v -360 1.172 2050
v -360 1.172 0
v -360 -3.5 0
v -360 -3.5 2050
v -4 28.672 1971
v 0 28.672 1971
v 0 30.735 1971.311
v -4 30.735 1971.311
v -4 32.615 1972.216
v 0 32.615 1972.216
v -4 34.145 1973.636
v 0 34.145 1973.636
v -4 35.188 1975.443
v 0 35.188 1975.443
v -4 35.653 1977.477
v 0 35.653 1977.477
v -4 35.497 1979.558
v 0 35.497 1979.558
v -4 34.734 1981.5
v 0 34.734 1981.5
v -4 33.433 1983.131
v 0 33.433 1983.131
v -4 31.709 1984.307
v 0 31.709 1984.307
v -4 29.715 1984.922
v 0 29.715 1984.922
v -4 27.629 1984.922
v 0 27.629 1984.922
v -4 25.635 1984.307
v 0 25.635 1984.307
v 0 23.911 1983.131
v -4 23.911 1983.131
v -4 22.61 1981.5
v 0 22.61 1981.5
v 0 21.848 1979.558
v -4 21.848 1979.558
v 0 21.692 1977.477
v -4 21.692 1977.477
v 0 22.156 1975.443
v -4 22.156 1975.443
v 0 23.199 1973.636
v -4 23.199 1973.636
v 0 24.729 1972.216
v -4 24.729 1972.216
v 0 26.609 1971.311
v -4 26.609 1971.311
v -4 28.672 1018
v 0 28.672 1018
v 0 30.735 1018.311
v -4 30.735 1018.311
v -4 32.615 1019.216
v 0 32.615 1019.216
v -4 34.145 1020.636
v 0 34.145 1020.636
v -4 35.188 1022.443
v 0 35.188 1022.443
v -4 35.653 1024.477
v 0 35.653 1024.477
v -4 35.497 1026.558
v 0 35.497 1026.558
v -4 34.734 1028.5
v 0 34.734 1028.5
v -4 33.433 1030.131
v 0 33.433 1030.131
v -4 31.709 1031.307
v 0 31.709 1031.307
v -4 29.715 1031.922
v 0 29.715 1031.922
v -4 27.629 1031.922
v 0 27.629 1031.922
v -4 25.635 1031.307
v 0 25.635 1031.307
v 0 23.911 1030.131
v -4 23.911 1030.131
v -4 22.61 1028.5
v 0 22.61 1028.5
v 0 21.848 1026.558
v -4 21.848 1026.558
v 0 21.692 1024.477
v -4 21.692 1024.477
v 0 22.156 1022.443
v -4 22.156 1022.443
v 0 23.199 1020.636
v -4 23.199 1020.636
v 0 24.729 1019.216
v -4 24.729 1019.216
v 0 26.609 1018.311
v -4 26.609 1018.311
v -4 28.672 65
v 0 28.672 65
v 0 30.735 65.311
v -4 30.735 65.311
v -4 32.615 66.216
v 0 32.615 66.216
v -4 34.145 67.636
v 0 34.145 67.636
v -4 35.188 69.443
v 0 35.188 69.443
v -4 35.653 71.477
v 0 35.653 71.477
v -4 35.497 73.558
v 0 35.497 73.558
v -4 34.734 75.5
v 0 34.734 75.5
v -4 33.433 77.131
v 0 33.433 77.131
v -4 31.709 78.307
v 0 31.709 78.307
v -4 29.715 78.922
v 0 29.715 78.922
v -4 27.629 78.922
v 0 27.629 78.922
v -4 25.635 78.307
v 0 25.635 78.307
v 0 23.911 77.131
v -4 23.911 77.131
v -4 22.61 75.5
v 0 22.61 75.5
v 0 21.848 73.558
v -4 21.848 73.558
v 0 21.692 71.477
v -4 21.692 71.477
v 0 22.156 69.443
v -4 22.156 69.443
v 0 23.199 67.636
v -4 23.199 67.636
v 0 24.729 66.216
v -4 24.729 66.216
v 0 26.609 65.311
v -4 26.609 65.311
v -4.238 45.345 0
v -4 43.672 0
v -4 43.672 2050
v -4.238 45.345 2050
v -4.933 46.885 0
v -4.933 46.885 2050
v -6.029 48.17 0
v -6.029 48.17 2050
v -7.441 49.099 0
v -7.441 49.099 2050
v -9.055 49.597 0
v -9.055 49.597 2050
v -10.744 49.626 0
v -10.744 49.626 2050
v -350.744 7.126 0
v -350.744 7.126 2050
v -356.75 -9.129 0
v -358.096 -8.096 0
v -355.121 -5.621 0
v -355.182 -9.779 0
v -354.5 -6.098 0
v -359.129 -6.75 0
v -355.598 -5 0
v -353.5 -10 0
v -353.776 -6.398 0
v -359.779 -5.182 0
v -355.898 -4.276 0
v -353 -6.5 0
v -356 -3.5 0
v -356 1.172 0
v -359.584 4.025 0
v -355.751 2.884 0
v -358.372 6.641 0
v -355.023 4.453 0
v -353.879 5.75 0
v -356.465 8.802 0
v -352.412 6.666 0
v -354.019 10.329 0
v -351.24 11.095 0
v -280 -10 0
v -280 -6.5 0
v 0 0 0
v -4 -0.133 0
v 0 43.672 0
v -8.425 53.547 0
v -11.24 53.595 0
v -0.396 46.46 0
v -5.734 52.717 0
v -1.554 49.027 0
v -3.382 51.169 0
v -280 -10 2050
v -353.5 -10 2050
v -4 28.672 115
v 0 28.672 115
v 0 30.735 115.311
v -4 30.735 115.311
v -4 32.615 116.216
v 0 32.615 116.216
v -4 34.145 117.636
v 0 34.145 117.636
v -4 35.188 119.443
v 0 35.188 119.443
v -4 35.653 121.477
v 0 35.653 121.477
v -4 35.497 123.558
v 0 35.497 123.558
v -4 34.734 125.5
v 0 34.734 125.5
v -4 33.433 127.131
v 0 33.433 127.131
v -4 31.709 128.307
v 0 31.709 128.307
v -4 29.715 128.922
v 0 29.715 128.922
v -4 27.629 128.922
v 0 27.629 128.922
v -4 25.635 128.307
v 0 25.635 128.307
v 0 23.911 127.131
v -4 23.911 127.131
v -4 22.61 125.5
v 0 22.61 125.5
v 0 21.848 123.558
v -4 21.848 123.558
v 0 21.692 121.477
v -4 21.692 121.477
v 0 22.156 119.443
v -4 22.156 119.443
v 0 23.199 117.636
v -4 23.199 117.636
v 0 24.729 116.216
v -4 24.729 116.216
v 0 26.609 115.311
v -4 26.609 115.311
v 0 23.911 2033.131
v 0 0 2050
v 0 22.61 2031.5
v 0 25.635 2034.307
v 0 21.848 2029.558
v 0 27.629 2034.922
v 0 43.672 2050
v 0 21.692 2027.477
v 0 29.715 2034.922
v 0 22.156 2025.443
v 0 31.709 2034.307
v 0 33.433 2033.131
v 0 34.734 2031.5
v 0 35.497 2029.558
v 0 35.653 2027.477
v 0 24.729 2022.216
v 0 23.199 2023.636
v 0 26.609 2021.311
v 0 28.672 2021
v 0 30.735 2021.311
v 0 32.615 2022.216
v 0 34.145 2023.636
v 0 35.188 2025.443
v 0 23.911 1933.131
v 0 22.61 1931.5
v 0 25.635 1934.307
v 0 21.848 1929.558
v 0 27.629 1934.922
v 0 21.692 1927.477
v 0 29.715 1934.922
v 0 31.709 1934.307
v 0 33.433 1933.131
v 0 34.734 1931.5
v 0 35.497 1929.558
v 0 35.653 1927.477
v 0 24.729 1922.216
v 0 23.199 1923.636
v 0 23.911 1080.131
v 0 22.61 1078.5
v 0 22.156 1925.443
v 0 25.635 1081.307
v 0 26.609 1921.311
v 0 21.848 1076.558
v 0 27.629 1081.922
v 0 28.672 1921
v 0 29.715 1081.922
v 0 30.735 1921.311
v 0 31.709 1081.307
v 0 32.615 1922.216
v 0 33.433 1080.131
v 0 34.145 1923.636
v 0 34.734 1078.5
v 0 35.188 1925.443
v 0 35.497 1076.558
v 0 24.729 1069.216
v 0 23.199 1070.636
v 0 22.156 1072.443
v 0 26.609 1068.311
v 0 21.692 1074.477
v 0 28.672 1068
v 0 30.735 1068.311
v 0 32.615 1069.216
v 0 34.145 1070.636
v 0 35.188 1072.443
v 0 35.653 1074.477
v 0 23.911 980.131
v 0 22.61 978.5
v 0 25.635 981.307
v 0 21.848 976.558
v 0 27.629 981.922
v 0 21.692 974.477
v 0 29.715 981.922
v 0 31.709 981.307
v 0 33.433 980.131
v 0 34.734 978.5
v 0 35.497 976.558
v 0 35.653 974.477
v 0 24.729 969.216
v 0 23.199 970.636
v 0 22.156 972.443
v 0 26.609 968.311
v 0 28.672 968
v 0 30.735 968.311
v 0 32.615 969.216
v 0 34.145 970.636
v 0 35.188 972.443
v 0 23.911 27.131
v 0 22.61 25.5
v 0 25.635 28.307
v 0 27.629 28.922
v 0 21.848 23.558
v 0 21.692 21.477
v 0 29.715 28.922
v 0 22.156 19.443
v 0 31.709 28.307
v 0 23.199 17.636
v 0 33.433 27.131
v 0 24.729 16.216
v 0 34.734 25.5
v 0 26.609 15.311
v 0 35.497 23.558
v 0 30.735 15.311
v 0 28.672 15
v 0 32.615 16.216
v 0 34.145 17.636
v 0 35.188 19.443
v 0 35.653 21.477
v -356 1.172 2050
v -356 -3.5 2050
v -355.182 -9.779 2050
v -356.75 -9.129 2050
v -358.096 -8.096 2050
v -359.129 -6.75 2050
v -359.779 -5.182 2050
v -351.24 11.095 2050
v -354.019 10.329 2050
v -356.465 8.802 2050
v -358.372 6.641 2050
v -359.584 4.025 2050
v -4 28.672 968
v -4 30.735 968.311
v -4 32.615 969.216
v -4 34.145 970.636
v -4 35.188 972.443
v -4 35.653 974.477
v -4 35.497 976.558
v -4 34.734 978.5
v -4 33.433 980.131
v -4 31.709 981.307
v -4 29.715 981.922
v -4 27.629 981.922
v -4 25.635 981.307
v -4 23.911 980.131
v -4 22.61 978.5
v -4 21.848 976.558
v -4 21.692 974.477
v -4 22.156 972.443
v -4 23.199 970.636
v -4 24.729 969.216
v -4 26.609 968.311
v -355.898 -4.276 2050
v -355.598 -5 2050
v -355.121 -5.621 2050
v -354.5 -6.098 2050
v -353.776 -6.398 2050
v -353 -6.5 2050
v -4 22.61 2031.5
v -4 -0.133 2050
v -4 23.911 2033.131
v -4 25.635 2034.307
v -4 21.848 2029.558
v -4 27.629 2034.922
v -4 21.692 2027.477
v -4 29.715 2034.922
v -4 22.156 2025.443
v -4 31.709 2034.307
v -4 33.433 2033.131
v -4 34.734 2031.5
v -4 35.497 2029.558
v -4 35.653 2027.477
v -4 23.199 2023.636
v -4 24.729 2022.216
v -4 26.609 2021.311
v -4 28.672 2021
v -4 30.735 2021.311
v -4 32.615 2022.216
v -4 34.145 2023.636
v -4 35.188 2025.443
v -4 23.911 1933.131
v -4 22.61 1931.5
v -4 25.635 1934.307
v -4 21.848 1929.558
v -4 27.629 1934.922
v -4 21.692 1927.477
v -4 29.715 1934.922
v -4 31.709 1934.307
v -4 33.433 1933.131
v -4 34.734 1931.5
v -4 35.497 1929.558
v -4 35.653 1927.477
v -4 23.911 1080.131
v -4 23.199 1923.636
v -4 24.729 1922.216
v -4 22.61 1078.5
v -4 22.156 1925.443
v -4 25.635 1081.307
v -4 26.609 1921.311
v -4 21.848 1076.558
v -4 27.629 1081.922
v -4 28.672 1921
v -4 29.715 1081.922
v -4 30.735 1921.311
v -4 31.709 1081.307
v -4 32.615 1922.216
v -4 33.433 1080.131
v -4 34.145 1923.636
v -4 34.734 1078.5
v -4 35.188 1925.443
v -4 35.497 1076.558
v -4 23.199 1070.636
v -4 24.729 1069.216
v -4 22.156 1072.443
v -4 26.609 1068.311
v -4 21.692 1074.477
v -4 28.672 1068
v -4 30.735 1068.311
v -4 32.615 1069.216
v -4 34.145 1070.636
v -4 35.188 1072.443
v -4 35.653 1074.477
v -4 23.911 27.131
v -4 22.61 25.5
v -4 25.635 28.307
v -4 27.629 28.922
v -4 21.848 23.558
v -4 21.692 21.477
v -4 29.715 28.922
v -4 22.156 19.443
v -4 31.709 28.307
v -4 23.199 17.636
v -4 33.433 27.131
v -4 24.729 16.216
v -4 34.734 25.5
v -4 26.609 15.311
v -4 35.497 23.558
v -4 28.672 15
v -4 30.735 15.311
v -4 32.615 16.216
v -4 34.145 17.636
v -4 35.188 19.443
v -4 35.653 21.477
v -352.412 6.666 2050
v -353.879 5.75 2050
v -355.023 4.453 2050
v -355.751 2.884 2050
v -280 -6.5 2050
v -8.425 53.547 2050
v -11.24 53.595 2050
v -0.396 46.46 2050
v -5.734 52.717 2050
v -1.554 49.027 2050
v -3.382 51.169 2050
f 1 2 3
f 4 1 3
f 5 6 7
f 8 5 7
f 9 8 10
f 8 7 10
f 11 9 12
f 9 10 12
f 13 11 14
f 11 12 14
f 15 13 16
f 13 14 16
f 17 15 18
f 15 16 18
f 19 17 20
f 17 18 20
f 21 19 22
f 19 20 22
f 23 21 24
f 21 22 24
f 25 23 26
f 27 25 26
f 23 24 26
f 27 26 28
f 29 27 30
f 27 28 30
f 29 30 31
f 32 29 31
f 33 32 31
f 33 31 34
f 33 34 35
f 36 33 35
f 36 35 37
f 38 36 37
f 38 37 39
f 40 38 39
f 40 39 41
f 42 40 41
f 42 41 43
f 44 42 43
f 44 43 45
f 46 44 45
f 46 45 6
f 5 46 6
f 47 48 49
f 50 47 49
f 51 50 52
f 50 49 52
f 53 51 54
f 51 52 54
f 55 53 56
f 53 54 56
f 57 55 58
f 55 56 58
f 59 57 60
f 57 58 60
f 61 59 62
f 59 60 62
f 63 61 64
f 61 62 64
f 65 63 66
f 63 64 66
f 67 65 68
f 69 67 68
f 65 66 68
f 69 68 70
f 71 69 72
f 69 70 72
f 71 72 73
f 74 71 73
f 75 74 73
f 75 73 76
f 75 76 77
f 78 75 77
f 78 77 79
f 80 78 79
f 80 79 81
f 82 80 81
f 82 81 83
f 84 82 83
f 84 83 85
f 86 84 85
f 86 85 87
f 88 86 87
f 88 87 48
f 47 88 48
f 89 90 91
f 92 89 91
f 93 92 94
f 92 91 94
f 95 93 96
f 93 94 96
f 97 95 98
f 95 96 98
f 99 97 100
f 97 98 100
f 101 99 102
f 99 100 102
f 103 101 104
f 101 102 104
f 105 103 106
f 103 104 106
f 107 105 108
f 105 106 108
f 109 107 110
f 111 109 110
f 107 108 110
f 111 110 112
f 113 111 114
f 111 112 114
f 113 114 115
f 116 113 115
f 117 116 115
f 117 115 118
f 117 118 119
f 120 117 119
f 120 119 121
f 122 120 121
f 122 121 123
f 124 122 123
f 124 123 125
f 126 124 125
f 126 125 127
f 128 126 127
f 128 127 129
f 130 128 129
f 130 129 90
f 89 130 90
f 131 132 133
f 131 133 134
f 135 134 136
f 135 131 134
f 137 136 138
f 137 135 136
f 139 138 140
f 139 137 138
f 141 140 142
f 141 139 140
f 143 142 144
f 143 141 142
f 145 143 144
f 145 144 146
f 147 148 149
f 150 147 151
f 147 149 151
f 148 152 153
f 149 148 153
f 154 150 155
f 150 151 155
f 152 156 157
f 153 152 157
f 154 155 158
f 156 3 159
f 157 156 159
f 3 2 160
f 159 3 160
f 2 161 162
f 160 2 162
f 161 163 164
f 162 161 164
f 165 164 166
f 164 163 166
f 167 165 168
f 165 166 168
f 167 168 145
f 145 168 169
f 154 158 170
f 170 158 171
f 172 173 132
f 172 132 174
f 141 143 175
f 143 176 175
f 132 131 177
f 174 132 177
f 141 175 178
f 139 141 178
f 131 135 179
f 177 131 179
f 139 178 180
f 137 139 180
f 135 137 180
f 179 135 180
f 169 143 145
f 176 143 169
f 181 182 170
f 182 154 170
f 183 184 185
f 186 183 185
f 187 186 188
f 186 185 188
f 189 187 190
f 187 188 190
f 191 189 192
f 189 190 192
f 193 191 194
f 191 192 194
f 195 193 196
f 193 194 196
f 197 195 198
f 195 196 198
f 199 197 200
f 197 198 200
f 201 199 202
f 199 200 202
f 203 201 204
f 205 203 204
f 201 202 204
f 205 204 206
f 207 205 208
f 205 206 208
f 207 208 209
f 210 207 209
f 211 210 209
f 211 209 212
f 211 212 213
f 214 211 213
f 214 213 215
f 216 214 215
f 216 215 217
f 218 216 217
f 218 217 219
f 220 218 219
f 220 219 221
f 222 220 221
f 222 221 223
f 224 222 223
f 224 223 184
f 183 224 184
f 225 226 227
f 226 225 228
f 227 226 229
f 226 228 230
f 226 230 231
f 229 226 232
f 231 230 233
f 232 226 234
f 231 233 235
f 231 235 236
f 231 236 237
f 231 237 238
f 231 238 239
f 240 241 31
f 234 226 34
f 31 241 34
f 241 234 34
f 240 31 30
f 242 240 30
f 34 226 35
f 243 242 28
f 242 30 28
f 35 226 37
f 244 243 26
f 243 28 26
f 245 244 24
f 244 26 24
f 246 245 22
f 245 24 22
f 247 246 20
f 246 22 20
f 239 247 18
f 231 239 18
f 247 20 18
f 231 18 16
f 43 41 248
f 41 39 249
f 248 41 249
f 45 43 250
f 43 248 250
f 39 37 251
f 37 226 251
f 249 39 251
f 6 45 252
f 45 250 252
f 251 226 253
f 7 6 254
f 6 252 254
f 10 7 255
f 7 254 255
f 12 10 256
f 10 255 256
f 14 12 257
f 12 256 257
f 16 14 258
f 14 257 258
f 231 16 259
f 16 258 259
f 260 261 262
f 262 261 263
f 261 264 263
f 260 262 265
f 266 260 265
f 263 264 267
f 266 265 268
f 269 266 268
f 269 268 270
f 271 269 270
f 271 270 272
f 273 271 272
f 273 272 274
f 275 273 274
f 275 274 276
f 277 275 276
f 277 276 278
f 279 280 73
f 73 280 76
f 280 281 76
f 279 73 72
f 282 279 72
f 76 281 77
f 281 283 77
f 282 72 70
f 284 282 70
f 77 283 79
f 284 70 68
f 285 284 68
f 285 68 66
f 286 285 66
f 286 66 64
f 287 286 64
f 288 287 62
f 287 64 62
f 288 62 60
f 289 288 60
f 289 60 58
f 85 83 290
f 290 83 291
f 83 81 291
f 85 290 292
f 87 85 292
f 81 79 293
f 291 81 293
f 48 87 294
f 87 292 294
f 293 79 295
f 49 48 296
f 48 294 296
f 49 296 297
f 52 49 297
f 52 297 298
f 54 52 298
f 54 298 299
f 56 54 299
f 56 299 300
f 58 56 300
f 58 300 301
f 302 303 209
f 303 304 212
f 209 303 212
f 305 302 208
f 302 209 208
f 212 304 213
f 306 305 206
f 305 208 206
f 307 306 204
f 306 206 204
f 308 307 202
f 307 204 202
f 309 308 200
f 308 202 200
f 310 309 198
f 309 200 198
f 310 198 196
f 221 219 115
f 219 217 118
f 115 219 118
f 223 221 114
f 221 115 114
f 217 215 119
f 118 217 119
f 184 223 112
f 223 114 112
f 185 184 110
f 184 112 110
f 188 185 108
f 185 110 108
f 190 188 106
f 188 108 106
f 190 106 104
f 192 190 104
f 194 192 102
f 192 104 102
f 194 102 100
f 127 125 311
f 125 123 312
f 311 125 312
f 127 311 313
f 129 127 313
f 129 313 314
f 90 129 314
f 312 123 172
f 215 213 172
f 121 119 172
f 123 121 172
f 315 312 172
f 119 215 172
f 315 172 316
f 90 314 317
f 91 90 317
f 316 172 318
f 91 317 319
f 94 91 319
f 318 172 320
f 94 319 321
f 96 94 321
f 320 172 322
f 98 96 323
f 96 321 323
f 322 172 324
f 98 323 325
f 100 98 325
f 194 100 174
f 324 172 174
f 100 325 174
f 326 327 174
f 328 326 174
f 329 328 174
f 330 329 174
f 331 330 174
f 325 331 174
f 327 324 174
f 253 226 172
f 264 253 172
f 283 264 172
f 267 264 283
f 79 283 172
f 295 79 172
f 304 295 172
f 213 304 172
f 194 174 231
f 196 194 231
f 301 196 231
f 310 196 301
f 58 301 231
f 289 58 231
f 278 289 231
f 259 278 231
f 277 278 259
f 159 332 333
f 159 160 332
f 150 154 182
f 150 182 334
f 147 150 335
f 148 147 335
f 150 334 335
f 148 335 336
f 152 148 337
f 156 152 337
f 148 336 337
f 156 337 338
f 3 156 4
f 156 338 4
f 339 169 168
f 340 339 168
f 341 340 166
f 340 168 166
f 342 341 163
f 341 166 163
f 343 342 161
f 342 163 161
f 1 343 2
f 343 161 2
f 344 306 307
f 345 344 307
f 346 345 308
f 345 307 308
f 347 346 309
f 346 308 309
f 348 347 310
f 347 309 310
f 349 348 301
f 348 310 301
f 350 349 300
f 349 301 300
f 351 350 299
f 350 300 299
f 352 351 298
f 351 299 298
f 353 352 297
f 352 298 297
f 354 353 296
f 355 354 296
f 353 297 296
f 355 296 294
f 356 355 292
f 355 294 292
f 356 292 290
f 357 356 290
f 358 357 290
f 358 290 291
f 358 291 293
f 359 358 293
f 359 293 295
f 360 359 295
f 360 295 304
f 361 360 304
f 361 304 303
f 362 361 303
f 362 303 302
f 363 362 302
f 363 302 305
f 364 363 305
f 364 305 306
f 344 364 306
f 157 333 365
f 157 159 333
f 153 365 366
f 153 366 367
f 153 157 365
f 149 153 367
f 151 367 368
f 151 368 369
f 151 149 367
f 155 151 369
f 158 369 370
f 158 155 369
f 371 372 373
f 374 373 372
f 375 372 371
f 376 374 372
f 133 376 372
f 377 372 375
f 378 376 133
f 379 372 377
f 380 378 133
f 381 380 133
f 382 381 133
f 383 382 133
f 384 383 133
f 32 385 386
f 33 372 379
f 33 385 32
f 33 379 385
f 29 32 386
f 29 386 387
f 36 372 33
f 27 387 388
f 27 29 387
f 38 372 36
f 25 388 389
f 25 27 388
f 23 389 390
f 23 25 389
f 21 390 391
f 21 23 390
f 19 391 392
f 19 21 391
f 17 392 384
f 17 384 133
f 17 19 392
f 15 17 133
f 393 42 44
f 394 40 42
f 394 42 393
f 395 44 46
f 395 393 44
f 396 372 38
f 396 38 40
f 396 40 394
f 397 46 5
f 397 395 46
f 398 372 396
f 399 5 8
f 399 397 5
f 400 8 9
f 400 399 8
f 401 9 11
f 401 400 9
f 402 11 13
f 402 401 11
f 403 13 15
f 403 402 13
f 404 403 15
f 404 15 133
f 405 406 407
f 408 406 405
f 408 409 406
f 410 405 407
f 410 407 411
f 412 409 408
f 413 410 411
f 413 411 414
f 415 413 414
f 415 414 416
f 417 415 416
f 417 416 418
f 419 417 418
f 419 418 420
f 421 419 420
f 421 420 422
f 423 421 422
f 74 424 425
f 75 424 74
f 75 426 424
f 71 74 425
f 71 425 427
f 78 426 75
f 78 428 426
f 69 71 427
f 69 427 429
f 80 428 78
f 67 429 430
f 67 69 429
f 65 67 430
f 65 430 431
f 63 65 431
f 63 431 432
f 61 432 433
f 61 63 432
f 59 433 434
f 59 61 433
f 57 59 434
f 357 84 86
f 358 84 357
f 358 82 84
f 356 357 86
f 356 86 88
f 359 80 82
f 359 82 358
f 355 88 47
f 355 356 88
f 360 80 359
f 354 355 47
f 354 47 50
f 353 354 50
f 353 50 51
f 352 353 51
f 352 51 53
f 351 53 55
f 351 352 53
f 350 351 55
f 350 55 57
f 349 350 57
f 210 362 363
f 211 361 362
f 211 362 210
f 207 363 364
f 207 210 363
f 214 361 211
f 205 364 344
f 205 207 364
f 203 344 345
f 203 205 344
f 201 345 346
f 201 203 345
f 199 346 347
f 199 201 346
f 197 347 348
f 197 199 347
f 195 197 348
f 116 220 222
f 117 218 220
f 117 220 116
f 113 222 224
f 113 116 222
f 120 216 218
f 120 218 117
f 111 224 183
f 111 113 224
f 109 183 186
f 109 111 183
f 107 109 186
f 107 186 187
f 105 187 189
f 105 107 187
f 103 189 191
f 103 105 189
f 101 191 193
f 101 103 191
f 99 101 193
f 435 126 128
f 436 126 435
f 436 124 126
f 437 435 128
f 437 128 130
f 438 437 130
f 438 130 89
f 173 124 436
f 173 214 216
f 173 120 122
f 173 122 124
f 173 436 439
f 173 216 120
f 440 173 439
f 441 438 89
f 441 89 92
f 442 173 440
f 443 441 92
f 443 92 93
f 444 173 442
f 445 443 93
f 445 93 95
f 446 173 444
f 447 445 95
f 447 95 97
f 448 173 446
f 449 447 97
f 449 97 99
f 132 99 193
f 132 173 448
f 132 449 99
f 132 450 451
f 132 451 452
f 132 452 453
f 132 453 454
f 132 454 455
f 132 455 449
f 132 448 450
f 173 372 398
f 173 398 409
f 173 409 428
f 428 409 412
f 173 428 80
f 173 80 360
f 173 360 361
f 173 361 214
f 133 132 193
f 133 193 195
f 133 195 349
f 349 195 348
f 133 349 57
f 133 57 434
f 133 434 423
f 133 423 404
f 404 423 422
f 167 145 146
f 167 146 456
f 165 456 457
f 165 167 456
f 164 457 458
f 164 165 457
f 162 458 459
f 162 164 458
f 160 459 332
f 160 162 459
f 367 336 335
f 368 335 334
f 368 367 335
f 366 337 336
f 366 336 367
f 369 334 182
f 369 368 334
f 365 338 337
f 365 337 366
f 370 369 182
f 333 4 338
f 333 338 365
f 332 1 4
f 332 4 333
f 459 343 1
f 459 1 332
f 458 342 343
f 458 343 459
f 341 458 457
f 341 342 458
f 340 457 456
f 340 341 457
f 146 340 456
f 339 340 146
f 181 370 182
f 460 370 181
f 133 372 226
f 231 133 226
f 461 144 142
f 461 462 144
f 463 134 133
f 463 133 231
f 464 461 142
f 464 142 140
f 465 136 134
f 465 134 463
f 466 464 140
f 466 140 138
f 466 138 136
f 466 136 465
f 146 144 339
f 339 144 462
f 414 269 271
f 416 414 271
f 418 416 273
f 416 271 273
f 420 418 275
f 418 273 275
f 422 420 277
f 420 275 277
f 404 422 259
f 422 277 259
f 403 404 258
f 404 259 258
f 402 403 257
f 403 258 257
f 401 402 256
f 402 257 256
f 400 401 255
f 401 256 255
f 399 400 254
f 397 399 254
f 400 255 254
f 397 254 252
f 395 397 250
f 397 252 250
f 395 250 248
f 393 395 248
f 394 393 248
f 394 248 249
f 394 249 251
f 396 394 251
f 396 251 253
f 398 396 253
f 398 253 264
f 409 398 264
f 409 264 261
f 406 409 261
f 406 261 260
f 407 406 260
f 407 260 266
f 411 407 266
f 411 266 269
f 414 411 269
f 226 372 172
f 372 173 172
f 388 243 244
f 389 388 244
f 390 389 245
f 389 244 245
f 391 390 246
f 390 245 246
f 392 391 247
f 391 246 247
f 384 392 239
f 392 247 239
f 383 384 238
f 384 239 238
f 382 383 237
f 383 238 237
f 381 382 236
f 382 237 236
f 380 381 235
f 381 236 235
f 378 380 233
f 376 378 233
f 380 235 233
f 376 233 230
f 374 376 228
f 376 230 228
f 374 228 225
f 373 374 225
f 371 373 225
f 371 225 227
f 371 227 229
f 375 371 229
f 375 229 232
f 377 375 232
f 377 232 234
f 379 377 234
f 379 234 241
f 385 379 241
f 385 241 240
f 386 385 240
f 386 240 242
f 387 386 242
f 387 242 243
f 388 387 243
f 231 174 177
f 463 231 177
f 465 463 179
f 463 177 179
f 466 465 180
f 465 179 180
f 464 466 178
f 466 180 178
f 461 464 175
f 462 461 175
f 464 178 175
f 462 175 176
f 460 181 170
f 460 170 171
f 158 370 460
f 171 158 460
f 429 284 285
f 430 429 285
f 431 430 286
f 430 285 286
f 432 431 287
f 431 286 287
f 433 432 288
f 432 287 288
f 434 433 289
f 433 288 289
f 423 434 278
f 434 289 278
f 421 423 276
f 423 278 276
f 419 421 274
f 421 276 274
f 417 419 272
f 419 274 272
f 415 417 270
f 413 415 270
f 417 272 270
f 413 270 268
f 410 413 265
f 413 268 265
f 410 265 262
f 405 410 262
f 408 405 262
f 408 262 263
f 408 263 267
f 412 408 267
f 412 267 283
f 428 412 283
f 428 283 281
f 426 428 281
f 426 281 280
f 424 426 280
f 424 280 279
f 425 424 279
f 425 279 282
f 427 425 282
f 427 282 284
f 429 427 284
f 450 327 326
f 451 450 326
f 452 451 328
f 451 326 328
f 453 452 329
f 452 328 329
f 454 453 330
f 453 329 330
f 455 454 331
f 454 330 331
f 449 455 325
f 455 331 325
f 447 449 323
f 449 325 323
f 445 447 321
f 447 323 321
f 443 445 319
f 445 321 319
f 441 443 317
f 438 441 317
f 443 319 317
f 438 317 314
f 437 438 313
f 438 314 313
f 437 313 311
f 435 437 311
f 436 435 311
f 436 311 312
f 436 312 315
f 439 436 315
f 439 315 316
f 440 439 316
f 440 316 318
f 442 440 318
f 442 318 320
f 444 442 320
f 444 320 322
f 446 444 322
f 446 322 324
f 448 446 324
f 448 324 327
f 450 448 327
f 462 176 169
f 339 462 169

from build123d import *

# Parameters (mm, degrees)
EXTRUDE_1_DEPTH     = 2050
SHELL_1_T           = -4
CUT_EXTRUDE_1_REACH = 362
SKETCH_2_R          = 7
SKETCH_3_W          = 80
SKETCH_3_H          = 3.5
EXTRUDE_2_DEPTH     = 2050
FILLET_1_R          = 3
FILLET_2_R          = 6.5


with BuildPart() as part:
    # 草图1 → 凸台-拉伸1 (new body)
    with BuildSketch(Plane.XY):
        with BuildLine():
            Line((0, 0), (0, 43.672177815))
            ThreePointArc((0, 43.672177815), (-3.381974368, 51.168959573), (-11.240347346, 53.594956582))
            Line((-11.240347346, 53.594956582), (-351.240347346, 11.094956582))
            ThreePointArc((-351.240347346, 11.094956582), (-357.496781758, 7.790203447), (-360, 1.172177815))
            Line((-360, 1.172177815), (-360, -10))
            Line((-360, -10), (-300, -10))
            Line((-300, -10), (0, 0))
        make_face()
    extrude(amount=EXTRUDE_1_DEPTH)

    # 抽壳1
    shell_1_openings = [part.faces().sort_by_distance(p)[0] for p in [
        (-197.44558621, 13.389471059, 2050),
        (-330, -10, 1025),
        (-150, -5, 1025),
        (-197.44558621, 13.389471059, 0),
    ]]
    offset(amount=SHELL_1_T, openings=shell_1_openings, kind=Kind.INTERSECTION)

    # 草图2 → 切除-拉伸1 (cut, up to next)
    with BuildSketch(Plane(origin=(0, 0, 0), x_dir=(0, 0, -1), z_dir=(1, 0, 0)), mode=Mode.PRIVATE) as cut_extrude_1_sk1:
        with Locations((-2028, 28.672177815)):
            Circle(SKETCH_2_R)
    cut_extrude_1_tool1 = extrude(cut_extrude_1_sk1.sketch, amount=-CUT_EXTRUDE_1_REACH, mode=Mode.PRIVATE) & part.part
    add(cut_extrude_1_tool1.solids().sort_by_distance((0, 28.672178, 2028))[0], mode=Mode.SUBTRACT)
    # 草图2 → 切除-拉伸1 (cut, up to next)
    with BuildSketch(Plane(origin=(0, 0, 0), x_dir=(0, 0, -1), z_dir=(1, 0, 0)), mode=Mode.PRIVATE) as cut_extrude_1_sk2:
        with Locations((-1978, 28.672177815)):
            Circle(SKETCH_2_R)
    cut_extrude_1_tool2 = extrude(cut_extrude_1_sk2.sketch, amount=-CUT_EXTRUDE_1_REACH, mode=Mode.PRIVATE) & part.part
    add(cut_extrude_1_tool2.solids().sort_by_distance((0, 28.672178, 1978))[0], mode=Mode.SUBTRACT)
    # 草图2 → 切除-拉伸1 (cut, up to next)
    with BuildSketch(Plane(origin=(0, 0, 0), x_dir=(0, 0, -1), z_dir=(1, 0, 0)), mode=Mode.PRIVATE) as cut_extrude_1_sk3:
        with Locations((-1928, 28.672177815)):
            Circle(SKETCH_2_R)
    cut_extrude_1_tool3 = extrude(cut_extrude_1_sk3.sketch, amount=-CUT_EXTRUDE_1_REACH, mode=Mode.PRIVATE) & part.part
    add(cut_extrude_1_tool3.solids().sort_by_distance((0, 28.672178, 1928))[0], mode=Mode.SUBTRACT)
    # 草图2 → 切除-拉伸1 (cut, up to next)
    with BuildSketch(Plane(origin=(0, 0, 0), x_dir=(0, 0, -1), z_dir=(1, 0, 0)), mode=Mode.PRIVATE) as cut_extrude_1_sk4:
        with Locations((-122, 28.672177815)):
            Circle(SKETCH_2_R)
    cut_extrude_1_tool4 = extrude(cut_extrude_1_sk4.sketch, amount=-CUT_EXTRUDE_1_REACH, mode=Mode.PRIVATE) & part.part
    add(cut_extrude_1_tool4.solids().sort_by_distance((0, 28.672178, 122))[0], mode=Mode.SUBTRACT)
    # 草图2 → 切除-拉伸1 (cut, up to next)
    with BuildSketch(Plane(origin=(0, 0, 0), x_dir=(0, 0, -1), z_dir=(1, 0, 0)), mode=Mode.PRIVATE) as cut_extrude_1_sk5:
        with Locations((-72, 28.672177815)):
            Circle(SKETCH_2_R)
    cut_extrude_1_tool5 = extrude(cut_extrude_1_sk5.sketch, amount=-CUT_EXTRUDE_1_REACH, mode=Mode.PRIVATE) & part.part
    add(cut_extrude_1_tool5.solids().sort_by_distance((0, 28.672178, 72))[0], mode=Mode.SUBTRACT)
    # 草图2 → 切除-拉伸1 (cut, up to next)
    with BuildSketch(Plane(origin=(0, 0, 0), x_dir=(0, 0, -1), z_dir=(1, 0, 0)), mode=Mode.PRIVATE) as cut_extrude_1_sk6:
        with Locations((-22, 28.672177815)):
            Circle(SKETCH_2_R)
    cut_extrude_1_tool6 = extrude(cut_extrude_1_sk6.sketch, amount=-CUT_EXTRUDE_1_REACH, mode=Mode.PRIVATE) & part.part
    add(cut_extrude_1_tool6.solids().sort_by_distance((0, 28.672178, 22))[0], mode=Mode.SUBTRACT)
    # 草图2 → 切除-拉伸1 (cut, up to next)
    with BuildSketch(Plane(origin=(0, 0, 0), x_dir=(0, 0, -1), z_dir=(1, 0, 0)), mode=Mode.PRIVATE) as cut_extrude_1_sk7:
        with Locations((-1025, 28.672177815)):
            Circle(SKETCH_2_R)
    cut_extrude_1_tool7 = extrude(cut_extrude_1_sk7.sketch, amount=-CUT_EXTRUDE_1_REACH, mode=Mode.PRIVATE) & part.part
    add(cut_extrude_1_tool7.solids().sort_by_distance((0, 28.672178, 1025))[0], mode=Mode.SUBTRACT)
    # 草图2 → 切除-拉伸1 (cut, up to next)
    with BuildSketch(Plane(origin=(0, 0, 0), x_dir=(0, 0, -1), z_dir=(1, 0, 0)), mode=Mode.PRIVATE) as cut_extrude_1_sk8:
        with Locations((-1075, 28.672177815)):
            Circle(SKETCH_2_R)
    cut_extrude_1_tool8 = extrude(cut_extrude_1_sk8.sketch, amount=-CUT_EXTRUDE_1_REACH, mode=Mode.PRIVATE) & part.part
    add(cut_extrude_1_tool8.solids().sort_by_distance((0, 28.672178, 1075))[0], mode=Mode.SUBTRACT)
    # 草图2 → 切除-拉伸1 (cut, up to next)
    with BuildSketch(Plane(origin=(0, 0, 0), x_dir=(0, 0, -1), z_dir=(1, 0, 0)), mode=Mode.PRIVATE) as cut_extrude_1_sk9:
        with Locations((-975, 28.672177815)):
            Circle(SKETCH_2_R)
    cut_extrude_1_tool9 = extrude(cut_extrude_1_sk9.sketch, amount=-CUT_EXTRUDE_1_REACH, mode=Mode.PRIVATE) & part.part
    add(cut_extrude_1_tool9.solids().sort_by_distance((0, 28.672178, 975))[0], mode=Mode.SUBTRACT)

    # 草图3 → 凸台-拉伸2 (add)
    with BuildSketch(Plane.XY.offset(2050)):
        with Locations((-320, -8.25)):
            Rectangle(SKETCH_3_W, SKETCH_3_H)
    extrude(amount=-EXTRUDE_2_DEPTH)

    # 圆角1
    fillet_1_edges = [part.edges().sort_by_distance(p)[0] for p in [
        (-356, -6.5, 1025),
    ]]
    fillet(fillet_1_edges, radius=FILLET_1_R)

    # 圆角2
    fillet_2_edges = [part.edges().sort_by_distance(p)[0] for p in [
        (-360, -10, 1025),
    ]]
    fillet(fillet_2_edges, radius=FILLET_2_R)


solid = part.part
